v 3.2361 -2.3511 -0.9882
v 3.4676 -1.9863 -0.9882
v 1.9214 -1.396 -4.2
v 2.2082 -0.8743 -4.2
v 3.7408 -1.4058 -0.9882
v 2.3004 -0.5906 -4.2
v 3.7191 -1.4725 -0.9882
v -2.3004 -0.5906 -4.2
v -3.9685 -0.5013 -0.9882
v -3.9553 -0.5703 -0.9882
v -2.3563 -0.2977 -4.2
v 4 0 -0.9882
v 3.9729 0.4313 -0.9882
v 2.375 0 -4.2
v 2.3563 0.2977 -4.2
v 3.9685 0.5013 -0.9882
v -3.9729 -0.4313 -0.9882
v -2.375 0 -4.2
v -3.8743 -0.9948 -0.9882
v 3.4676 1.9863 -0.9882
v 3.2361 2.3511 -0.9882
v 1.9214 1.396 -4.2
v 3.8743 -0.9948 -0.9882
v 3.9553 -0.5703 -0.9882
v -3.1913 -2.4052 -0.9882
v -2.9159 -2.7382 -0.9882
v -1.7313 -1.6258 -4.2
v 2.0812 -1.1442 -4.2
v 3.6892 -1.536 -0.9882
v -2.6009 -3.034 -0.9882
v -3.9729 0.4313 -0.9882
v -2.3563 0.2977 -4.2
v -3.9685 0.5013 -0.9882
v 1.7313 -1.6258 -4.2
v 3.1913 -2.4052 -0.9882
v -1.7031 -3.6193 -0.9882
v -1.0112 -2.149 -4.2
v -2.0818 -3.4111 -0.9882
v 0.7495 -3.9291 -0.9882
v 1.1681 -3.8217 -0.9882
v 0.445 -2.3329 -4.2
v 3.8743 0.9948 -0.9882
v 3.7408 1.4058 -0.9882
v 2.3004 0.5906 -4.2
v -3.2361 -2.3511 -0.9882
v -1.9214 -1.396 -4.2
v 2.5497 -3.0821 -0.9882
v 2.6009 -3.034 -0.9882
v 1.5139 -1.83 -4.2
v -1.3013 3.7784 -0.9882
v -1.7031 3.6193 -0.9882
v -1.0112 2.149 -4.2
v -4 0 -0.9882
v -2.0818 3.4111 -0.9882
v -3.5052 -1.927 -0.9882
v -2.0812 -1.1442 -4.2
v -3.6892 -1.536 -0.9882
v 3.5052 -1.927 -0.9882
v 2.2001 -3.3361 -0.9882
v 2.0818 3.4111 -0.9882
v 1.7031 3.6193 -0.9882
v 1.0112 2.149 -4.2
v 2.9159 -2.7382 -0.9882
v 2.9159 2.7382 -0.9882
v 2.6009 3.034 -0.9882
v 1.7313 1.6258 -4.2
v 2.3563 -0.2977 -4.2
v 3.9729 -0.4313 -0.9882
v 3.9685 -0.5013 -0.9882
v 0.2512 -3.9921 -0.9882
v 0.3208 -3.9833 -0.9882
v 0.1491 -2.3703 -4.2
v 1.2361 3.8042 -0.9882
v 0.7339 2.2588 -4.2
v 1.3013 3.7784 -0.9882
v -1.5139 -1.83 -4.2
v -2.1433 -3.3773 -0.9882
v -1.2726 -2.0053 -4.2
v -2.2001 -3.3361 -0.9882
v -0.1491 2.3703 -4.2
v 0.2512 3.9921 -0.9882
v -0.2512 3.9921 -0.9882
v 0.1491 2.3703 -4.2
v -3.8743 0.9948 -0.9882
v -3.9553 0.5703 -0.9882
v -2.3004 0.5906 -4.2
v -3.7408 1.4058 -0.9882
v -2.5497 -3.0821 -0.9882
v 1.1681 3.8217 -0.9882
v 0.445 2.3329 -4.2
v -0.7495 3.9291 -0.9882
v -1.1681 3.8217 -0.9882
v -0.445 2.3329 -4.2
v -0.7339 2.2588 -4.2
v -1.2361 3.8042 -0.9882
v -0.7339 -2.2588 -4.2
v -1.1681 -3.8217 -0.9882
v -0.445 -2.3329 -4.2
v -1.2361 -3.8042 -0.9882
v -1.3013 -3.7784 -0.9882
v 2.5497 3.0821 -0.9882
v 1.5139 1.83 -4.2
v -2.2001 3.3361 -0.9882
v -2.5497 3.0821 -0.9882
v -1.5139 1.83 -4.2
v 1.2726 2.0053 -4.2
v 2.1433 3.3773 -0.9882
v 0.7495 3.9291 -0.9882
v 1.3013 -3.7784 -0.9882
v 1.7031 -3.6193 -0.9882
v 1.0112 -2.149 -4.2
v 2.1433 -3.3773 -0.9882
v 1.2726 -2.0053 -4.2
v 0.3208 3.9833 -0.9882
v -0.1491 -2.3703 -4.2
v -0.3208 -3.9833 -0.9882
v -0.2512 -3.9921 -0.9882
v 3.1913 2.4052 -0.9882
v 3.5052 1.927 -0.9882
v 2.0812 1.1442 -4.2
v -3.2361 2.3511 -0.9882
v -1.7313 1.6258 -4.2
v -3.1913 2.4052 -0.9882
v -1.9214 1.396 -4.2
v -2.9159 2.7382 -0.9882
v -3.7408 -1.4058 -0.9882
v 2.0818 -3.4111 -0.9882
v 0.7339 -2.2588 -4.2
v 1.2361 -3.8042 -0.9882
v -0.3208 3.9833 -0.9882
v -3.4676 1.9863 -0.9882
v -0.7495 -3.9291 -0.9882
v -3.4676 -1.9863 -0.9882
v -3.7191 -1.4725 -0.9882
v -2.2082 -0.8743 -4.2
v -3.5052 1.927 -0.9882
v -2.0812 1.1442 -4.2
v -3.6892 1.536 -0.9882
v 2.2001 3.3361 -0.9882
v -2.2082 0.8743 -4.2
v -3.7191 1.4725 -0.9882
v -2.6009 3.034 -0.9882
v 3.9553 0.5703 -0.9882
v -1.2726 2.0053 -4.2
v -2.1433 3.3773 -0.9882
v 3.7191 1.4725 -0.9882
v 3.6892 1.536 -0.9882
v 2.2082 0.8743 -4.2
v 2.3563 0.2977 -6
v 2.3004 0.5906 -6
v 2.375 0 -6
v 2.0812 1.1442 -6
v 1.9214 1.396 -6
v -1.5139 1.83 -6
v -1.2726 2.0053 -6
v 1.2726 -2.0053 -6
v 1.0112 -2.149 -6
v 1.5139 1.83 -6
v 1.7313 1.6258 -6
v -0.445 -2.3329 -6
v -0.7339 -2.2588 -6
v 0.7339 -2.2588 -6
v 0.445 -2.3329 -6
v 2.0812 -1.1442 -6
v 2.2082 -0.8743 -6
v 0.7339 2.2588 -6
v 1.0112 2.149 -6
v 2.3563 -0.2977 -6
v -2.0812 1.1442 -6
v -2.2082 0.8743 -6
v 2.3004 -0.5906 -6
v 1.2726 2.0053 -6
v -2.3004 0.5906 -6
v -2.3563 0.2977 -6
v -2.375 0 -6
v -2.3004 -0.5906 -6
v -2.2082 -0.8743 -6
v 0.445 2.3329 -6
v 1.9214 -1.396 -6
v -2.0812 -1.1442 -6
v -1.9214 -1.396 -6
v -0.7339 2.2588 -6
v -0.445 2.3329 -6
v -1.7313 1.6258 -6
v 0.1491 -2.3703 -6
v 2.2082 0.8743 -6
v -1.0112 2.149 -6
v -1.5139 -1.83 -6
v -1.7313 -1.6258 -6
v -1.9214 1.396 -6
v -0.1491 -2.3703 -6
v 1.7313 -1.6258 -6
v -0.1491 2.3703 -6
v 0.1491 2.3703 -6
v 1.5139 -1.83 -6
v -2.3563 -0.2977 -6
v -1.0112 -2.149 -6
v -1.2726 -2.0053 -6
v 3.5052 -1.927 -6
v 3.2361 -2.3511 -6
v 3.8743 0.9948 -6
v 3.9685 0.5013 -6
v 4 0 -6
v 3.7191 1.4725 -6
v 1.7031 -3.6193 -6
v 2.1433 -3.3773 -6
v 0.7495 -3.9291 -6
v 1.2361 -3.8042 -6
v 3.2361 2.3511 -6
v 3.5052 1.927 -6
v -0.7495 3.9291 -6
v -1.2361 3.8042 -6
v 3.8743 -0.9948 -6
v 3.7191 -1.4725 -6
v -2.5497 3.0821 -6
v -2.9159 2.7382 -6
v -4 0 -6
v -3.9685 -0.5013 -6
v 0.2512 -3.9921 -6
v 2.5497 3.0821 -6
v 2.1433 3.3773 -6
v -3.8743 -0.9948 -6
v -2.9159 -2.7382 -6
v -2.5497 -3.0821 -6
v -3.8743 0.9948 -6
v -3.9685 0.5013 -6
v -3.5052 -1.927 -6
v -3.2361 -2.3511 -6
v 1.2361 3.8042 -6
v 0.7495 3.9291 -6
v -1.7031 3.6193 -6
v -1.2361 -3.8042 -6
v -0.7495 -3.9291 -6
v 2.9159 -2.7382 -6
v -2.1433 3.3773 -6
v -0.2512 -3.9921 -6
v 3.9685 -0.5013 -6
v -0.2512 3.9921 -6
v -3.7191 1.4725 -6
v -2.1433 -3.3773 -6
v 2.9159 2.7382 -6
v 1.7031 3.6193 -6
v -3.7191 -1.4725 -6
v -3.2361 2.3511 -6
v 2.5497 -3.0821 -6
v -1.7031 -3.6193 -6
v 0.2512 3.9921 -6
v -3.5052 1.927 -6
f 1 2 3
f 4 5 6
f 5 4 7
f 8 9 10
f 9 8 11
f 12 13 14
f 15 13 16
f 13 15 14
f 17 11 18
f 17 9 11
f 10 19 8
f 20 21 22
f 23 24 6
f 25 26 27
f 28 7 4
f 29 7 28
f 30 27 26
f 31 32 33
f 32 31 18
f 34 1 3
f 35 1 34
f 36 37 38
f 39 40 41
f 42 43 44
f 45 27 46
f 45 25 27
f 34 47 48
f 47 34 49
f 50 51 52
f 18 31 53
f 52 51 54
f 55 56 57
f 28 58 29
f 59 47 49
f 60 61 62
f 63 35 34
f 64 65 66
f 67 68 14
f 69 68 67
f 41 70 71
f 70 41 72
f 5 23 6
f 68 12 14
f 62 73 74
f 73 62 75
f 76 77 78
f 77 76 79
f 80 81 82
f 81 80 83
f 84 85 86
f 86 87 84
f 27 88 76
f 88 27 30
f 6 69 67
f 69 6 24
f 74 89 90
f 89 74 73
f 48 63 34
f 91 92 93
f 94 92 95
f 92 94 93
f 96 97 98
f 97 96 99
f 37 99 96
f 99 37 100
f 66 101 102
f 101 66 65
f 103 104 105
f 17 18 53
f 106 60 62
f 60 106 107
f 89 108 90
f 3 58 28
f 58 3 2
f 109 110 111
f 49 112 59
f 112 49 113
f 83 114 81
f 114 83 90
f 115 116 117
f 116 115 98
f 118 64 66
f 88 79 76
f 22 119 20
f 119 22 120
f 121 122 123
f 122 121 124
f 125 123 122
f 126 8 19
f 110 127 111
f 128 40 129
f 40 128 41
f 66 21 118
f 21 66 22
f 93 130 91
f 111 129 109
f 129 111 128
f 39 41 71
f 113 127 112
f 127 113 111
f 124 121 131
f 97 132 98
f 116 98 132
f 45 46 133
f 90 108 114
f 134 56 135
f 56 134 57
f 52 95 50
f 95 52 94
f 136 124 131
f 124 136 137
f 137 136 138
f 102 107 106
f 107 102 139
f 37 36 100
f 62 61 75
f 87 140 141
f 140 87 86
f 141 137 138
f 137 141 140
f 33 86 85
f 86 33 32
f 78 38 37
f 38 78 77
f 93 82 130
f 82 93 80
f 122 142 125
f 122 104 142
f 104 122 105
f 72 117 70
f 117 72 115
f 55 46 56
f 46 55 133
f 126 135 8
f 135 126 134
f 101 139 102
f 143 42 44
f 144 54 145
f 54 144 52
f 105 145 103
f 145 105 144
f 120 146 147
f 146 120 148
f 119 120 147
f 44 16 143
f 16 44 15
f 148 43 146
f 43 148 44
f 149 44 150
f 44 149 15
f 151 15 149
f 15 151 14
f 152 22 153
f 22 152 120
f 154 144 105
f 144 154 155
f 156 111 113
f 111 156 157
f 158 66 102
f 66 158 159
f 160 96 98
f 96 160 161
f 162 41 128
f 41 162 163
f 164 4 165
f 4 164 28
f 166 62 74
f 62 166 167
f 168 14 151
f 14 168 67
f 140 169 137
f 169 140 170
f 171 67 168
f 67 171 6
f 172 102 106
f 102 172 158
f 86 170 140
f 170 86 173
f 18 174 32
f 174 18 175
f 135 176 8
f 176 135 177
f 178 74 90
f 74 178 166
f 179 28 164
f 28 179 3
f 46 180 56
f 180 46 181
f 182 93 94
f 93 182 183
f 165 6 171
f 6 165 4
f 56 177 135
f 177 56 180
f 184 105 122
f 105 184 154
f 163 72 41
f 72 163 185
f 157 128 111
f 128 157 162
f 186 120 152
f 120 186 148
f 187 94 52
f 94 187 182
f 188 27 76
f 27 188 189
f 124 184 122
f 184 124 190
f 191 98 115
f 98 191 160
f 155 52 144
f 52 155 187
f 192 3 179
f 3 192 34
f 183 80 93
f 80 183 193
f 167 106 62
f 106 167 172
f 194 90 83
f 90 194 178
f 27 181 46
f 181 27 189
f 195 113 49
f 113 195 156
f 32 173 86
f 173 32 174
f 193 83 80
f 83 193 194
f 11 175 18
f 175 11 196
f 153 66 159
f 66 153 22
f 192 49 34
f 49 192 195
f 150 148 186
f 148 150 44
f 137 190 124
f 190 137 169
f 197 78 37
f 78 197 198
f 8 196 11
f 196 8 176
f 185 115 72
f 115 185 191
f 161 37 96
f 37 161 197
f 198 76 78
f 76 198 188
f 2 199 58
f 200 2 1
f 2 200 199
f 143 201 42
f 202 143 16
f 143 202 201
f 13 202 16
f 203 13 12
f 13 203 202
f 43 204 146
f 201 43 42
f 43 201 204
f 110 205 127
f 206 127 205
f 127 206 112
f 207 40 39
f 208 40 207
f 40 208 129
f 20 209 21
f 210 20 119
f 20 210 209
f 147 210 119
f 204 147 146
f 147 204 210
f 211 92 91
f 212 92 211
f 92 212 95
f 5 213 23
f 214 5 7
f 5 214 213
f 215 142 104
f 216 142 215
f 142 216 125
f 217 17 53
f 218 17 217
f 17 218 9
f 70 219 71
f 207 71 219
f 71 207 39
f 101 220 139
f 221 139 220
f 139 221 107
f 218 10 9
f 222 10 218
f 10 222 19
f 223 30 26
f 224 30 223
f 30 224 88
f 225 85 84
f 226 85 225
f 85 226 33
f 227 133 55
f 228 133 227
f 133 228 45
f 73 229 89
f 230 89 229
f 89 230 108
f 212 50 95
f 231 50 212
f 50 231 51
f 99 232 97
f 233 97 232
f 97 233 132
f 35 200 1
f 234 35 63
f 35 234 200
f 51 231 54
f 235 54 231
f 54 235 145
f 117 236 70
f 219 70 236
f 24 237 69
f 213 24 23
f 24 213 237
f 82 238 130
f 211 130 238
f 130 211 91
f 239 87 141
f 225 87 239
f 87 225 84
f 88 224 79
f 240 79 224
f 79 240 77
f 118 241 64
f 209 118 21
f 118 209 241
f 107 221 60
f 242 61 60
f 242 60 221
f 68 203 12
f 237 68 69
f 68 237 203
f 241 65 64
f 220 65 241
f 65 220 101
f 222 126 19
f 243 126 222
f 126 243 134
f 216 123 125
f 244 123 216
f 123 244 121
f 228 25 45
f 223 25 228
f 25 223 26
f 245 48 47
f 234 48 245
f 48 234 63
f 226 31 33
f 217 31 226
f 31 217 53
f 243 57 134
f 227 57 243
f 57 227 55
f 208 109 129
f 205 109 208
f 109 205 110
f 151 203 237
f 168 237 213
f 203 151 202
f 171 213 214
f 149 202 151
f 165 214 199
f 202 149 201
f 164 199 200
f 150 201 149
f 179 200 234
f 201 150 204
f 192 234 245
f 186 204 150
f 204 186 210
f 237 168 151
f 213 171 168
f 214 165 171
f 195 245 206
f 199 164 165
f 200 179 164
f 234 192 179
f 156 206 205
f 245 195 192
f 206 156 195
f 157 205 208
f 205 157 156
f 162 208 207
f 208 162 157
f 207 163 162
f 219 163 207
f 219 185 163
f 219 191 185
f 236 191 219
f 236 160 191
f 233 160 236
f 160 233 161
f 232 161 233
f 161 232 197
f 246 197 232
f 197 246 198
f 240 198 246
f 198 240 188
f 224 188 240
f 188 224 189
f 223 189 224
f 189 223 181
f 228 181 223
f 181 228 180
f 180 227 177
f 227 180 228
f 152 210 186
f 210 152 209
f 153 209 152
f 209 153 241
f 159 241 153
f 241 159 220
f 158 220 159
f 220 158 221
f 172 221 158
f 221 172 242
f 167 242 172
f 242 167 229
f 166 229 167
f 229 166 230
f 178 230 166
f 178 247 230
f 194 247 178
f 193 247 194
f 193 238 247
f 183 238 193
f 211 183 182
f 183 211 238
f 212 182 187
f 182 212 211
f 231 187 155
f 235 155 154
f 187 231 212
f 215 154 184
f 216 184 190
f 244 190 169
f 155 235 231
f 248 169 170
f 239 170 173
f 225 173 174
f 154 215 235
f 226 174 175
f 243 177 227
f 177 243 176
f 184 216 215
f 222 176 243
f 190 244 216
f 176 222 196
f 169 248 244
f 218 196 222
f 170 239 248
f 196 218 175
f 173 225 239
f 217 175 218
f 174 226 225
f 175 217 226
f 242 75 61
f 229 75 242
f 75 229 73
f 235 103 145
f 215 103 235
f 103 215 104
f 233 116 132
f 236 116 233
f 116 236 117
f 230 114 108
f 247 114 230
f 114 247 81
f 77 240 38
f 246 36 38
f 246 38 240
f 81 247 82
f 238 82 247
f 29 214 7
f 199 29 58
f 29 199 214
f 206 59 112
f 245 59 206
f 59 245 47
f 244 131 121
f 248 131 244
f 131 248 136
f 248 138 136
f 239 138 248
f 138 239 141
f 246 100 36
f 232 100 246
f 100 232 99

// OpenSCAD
$fn = 50;

difference() {
	union() {
		translate(v = [0, 0, -6.0]) {
			cylinder(h = 9, r = 4.0);
		}
	}
	union() {
		translate(v = [0, 0, 0]) {
			rotate(a = [0, 0, 0]) {
				difference() {
					union() {
						translate(v = [0, 0, -9.0]) {
							cylinder(h = 9, r = 2.25);
						}
						translate(v = [0, 0, -4.2]) {
							cylinder(h = 4.2, r1 = 2.375, r2 = 4.5);
						}
						translate(v = [0, 0, -9.0]) {
							cylinder(h = 9, r = 2.375);
						}
						translate(v = [0, 0, -9.0]) {
							cylinder(h = 9, r = 2.25);
						}
					}
					union();
				}
			}
		}
		#cylinder(h = 3, r = 5.0);
	}
}
